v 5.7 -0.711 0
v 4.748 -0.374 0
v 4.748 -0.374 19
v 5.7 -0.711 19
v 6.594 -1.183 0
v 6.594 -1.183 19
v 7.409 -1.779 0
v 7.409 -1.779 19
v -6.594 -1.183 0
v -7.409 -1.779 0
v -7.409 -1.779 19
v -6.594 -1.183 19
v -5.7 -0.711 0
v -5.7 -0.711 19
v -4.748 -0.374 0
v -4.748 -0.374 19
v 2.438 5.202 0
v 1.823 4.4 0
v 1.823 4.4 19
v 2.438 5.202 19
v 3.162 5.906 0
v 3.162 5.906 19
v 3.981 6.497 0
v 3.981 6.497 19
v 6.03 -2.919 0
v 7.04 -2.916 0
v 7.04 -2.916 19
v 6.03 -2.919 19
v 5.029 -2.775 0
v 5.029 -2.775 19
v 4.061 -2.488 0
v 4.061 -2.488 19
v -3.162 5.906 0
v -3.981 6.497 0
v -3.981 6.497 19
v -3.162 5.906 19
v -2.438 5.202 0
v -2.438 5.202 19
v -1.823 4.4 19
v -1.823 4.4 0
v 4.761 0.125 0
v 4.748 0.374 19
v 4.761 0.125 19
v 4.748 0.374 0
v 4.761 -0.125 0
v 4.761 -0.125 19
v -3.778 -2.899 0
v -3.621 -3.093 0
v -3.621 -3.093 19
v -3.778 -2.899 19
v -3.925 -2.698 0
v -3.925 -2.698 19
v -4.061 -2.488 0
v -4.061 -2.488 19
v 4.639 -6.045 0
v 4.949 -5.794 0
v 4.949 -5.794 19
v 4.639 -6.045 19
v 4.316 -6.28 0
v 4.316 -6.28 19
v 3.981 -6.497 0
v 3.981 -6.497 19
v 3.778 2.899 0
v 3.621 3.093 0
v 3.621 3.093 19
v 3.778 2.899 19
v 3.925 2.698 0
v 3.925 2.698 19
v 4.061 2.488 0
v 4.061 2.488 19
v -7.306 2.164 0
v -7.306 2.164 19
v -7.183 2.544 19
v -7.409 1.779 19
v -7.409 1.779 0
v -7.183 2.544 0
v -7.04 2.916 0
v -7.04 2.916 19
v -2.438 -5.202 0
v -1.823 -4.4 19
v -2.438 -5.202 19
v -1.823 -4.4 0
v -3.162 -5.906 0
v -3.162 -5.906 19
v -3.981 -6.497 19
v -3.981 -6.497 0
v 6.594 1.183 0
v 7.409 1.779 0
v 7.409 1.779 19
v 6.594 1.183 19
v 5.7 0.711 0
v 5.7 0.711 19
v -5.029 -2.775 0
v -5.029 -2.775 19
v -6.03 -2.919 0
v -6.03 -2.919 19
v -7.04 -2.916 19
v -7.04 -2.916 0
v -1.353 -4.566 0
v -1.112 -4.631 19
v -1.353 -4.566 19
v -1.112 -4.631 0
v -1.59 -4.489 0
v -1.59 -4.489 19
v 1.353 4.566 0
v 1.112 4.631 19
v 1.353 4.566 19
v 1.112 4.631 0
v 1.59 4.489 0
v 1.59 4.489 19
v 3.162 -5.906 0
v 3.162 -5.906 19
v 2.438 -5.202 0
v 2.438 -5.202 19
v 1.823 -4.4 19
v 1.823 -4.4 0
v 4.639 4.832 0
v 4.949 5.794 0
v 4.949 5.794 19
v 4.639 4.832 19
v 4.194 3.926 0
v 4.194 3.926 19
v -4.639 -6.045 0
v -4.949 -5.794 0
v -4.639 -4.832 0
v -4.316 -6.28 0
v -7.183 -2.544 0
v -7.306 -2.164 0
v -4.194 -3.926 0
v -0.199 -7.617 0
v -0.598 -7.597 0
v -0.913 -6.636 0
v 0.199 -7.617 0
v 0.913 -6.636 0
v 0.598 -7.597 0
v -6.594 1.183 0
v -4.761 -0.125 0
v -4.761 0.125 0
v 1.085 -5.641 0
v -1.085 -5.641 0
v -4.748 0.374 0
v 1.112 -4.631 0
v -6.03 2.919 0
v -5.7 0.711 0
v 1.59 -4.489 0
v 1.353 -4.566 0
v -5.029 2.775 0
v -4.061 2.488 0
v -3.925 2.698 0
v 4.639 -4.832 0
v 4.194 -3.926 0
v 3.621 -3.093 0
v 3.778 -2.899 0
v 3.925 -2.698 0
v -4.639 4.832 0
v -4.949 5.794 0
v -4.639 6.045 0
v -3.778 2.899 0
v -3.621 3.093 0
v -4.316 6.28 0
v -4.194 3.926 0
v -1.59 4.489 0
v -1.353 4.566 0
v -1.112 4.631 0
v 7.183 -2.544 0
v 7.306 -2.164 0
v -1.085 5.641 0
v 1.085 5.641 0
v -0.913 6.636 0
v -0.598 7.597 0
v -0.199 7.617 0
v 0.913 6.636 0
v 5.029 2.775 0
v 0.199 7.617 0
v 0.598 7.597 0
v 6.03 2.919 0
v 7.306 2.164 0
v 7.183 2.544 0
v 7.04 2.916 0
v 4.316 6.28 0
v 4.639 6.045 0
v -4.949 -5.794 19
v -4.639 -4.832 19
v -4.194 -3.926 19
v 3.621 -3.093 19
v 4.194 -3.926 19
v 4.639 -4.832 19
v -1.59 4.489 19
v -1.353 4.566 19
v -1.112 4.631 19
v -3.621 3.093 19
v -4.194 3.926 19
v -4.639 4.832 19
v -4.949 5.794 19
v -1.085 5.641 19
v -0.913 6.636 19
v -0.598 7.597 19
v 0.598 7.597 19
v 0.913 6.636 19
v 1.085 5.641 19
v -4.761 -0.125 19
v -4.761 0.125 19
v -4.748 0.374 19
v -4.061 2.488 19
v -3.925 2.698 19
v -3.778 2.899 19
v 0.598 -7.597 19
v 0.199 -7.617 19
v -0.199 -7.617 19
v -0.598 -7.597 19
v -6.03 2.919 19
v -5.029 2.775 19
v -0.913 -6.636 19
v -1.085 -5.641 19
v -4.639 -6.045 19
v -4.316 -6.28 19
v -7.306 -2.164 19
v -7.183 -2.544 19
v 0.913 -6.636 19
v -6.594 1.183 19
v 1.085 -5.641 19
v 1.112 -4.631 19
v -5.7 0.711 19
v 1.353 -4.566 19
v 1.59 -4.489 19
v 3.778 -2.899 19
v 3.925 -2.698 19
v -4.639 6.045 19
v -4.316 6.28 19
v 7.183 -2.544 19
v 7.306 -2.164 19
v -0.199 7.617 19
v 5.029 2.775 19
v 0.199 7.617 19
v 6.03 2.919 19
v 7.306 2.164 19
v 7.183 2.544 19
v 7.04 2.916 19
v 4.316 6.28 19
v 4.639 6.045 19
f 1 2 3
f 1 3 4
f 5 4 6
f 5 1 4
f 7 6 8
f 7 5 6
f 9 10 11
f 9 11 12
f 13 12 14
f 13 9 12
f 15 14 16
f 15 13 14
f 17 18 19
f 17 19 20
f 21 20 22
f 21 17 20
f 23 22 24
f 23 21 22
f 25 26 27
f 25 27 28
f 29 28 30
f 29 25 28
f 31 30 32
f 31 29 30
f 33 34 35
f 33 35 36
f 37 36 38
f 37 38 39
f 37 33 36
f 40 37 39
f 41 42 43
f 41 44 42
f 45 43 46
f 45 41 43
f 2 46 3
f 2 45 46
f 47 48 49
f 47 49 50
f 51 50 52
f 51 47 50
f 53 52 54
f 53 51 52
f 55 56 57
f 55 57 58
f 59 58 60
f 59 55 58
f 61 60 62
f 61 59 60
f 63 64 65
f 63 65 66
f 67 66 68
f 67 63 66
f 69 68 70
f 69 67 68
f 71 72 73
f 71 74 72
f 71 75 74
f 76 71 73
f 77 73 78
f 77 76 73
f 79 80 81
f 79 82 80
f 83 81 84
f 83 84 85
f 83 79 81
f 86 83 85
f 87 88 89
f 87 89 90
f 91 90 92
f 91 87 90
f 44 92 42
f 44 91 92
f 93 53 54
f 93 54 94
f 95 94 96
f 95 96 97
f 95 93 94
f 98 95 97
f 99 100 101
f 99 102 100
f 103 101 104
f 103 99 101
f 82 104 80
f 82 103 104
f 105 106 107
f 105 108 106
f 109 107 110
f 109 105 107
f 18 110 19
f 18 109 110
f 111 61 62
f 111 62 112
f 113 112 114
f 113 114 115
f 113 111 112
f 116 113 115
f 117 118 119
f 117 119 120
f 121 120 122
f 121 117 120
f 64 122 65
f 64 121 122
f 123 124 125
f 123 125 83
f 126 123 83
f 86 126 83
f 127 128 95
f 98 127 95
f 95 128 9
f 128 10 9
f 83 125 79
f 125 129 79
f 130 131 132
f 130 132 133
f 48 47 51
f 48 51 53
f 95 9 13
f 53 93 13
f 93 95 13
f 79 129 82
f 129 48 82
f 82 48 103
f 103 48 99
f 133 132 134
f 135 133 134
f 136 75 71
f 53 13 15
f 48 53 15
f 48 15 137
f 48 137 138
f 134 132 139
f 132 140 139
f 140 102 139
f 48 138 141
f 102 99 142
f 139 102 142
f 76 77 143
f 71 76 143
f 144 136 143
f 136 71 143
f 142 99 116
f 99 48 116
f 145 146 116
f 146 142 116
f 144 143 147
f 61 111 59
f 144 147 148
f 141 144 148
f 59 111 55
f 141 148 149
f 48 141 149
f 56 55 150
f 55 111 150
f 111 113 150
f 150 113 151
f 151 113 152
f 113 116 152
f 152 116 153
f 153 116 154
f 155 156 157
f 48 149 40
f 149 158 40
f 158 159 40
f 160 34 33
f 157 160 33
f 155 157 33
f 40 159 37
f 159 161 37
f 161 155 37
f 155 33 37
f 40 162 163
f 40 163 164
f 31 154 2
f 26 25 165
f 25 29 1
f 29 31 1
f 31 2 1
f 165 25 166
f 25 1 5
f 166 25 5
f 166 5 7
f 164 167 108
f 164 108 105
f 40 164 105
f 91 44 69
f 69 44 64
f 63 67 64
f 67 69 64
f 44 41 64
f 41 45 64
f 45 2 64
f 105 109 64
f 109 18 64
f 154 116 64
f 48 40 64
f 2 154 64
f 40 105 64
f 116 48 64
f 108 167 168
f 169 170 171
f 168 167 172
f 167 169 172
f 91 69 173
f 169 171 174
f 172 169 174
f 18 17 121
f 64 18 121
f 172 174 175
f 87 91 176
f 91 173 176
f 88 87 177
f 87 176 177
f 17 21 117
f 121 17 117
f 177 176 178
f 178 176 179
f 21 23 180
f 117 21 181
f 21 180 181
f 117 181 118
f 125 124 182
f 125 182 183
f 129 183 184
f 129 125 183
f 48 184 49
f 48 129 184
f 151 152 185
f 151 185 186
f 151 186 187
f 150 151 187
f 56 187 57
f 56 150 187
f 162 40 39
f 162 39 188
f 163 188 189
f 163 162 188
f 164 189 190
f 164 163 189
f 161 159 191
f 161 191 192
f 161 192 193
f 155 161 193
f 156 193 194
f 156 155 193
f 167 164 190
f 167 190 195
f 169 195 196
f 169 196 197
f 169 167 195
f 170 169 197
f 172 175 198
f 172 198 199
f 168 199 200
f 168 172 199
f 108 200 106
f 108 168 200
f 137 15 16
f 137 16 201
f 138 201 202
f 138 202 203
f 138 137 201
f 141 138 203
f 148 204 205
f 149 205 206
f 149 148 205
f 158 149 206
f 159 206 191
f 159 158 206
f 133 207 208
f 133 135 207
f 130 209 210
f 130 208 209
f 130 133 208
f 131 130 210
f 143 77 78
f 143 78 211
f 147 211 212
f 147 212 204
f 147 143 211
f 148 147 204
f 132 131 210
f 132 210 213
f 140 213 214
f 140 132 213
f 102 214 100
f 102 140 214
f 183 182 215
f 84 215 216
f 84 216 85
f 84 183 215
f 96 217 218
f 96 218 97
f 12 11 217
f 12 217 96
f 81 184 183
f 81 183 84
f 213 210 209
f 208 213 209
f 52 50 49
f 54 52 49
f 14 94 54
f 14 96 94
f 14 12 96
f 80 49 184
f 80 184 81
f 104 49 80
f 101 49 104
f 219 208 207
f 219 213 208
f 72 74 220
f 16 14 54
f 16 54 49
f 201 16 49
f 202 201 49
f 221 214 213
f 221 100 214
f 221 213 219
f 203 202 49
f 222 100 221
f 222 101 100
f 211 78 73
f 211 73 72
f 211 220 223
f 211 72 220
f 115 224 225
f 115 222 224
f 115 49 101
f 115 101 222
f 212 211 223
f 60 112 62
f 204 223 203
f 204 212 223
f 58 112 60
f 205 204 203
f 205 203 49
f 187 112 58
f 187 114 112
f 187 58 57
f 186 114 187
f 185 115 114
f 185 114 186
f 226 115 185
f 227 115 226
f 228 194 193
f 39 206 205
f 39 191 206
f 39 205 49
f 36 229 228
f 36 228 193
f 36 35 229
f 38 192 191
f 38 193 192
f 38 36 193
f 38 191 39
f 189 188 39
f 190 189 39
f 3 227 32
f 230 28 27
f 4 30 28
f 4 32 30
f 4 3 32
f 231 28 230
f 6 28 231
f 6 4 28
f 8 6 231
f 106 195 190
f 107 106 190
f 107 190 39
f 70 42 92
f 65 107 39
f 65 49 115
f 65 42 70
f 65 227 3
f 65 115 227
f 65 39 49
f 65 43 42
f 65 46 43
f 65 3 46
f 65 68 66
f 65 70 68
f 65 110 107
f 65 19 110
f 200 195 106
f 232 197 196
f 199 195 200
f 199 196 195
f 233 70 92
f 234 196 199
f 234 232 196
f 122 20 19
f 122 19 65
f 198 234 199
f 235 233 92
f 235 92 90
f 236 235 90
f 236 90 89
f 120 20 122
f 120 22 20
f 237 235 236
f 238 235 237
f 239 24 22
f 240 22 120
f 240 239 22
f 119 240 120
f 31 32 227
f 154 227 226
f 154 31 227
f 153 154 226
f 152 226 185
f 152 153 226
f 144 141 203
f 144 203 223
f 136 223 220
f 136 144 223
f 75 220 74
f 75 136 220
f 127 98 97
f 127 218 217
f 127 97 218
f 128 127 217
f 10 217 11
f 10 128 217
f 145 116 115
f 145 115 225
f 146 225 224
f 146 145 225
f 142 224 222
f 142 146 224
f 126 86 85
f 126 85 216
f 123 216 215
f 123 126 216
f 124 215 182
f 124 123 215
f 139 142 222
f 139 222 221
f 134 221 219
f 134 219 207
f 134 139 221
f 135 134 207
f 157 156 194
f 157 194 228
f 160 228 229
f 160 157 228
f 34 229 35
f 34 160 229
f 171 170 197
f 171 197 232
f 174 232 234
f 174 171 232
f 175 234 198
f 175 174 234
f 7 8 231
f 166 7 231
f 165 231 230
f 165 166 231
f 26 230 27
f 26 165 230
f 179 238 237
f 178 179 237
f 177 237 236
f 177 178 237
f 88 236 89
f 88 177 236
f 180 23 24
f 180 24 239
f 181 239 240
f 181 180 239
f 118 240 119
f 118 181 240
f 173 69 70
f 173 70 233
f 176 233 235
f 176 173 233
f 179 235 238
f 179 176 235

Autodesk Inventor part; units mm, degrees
sketch "Sketch1" plane through (0, 0, 0) normal (0, 0, 1) x (1, 0, 0)
  circle A0 centre (0, 0) radius 7.62
  dimension "d0" = 15.24
extrude "Extrusion1" add sketch "Sketch1" along normal blind 19
ref_plane "Work Plane2" through (0, 0, 9.5) normal (0, 0, 1) x (1, 0, 0)
sketch "Sketch2" plane through (0, 0, 0) normal (0, 0, -1) x (-1, 0, 0)
  circle A0 centre (0, 0) radius 7.62 projected
  circle A1 centre (0, 0) radius 6.35
  dimension "d3" = 12.7
surface extrude "Pitch Diameter" sketch "Sketch2" against normal through all shown no curves A1
ref_plane "Work Plane8" through (0, 0, 0) normal (0.9510565, 0.309017, 0) x (0, 0, 1)
ref_plane "Work Plane9" through (0, 0, 0) normal (1, 0, 0) x (0, 1, 0)
spur gear teeth "Spur Gear" teeth 10 pitch diameter 12.7 tip diameter 15.24 root diameter 9.525 face width 19 start plane through (0, 0, 0) normal (0, 0, -1) x (-1, 0, 0)
equation "\"d0\" = da_da"
equation "\"d1\" = da_b"
equation "\"d3\" = da_dw"
equation "\"d16\" = da_aw"
equation "\"d43\" = da_aw"
equation "\"d46\" = da_aw"
equation "\"da_da\" = 15.24"
equation "\"da_b\" = 19"
equation "\"da_dw\" = 12.7"
equation "\"da_aw\" = 38.1"
properties part number "Spur Gear1" material "Steel"
